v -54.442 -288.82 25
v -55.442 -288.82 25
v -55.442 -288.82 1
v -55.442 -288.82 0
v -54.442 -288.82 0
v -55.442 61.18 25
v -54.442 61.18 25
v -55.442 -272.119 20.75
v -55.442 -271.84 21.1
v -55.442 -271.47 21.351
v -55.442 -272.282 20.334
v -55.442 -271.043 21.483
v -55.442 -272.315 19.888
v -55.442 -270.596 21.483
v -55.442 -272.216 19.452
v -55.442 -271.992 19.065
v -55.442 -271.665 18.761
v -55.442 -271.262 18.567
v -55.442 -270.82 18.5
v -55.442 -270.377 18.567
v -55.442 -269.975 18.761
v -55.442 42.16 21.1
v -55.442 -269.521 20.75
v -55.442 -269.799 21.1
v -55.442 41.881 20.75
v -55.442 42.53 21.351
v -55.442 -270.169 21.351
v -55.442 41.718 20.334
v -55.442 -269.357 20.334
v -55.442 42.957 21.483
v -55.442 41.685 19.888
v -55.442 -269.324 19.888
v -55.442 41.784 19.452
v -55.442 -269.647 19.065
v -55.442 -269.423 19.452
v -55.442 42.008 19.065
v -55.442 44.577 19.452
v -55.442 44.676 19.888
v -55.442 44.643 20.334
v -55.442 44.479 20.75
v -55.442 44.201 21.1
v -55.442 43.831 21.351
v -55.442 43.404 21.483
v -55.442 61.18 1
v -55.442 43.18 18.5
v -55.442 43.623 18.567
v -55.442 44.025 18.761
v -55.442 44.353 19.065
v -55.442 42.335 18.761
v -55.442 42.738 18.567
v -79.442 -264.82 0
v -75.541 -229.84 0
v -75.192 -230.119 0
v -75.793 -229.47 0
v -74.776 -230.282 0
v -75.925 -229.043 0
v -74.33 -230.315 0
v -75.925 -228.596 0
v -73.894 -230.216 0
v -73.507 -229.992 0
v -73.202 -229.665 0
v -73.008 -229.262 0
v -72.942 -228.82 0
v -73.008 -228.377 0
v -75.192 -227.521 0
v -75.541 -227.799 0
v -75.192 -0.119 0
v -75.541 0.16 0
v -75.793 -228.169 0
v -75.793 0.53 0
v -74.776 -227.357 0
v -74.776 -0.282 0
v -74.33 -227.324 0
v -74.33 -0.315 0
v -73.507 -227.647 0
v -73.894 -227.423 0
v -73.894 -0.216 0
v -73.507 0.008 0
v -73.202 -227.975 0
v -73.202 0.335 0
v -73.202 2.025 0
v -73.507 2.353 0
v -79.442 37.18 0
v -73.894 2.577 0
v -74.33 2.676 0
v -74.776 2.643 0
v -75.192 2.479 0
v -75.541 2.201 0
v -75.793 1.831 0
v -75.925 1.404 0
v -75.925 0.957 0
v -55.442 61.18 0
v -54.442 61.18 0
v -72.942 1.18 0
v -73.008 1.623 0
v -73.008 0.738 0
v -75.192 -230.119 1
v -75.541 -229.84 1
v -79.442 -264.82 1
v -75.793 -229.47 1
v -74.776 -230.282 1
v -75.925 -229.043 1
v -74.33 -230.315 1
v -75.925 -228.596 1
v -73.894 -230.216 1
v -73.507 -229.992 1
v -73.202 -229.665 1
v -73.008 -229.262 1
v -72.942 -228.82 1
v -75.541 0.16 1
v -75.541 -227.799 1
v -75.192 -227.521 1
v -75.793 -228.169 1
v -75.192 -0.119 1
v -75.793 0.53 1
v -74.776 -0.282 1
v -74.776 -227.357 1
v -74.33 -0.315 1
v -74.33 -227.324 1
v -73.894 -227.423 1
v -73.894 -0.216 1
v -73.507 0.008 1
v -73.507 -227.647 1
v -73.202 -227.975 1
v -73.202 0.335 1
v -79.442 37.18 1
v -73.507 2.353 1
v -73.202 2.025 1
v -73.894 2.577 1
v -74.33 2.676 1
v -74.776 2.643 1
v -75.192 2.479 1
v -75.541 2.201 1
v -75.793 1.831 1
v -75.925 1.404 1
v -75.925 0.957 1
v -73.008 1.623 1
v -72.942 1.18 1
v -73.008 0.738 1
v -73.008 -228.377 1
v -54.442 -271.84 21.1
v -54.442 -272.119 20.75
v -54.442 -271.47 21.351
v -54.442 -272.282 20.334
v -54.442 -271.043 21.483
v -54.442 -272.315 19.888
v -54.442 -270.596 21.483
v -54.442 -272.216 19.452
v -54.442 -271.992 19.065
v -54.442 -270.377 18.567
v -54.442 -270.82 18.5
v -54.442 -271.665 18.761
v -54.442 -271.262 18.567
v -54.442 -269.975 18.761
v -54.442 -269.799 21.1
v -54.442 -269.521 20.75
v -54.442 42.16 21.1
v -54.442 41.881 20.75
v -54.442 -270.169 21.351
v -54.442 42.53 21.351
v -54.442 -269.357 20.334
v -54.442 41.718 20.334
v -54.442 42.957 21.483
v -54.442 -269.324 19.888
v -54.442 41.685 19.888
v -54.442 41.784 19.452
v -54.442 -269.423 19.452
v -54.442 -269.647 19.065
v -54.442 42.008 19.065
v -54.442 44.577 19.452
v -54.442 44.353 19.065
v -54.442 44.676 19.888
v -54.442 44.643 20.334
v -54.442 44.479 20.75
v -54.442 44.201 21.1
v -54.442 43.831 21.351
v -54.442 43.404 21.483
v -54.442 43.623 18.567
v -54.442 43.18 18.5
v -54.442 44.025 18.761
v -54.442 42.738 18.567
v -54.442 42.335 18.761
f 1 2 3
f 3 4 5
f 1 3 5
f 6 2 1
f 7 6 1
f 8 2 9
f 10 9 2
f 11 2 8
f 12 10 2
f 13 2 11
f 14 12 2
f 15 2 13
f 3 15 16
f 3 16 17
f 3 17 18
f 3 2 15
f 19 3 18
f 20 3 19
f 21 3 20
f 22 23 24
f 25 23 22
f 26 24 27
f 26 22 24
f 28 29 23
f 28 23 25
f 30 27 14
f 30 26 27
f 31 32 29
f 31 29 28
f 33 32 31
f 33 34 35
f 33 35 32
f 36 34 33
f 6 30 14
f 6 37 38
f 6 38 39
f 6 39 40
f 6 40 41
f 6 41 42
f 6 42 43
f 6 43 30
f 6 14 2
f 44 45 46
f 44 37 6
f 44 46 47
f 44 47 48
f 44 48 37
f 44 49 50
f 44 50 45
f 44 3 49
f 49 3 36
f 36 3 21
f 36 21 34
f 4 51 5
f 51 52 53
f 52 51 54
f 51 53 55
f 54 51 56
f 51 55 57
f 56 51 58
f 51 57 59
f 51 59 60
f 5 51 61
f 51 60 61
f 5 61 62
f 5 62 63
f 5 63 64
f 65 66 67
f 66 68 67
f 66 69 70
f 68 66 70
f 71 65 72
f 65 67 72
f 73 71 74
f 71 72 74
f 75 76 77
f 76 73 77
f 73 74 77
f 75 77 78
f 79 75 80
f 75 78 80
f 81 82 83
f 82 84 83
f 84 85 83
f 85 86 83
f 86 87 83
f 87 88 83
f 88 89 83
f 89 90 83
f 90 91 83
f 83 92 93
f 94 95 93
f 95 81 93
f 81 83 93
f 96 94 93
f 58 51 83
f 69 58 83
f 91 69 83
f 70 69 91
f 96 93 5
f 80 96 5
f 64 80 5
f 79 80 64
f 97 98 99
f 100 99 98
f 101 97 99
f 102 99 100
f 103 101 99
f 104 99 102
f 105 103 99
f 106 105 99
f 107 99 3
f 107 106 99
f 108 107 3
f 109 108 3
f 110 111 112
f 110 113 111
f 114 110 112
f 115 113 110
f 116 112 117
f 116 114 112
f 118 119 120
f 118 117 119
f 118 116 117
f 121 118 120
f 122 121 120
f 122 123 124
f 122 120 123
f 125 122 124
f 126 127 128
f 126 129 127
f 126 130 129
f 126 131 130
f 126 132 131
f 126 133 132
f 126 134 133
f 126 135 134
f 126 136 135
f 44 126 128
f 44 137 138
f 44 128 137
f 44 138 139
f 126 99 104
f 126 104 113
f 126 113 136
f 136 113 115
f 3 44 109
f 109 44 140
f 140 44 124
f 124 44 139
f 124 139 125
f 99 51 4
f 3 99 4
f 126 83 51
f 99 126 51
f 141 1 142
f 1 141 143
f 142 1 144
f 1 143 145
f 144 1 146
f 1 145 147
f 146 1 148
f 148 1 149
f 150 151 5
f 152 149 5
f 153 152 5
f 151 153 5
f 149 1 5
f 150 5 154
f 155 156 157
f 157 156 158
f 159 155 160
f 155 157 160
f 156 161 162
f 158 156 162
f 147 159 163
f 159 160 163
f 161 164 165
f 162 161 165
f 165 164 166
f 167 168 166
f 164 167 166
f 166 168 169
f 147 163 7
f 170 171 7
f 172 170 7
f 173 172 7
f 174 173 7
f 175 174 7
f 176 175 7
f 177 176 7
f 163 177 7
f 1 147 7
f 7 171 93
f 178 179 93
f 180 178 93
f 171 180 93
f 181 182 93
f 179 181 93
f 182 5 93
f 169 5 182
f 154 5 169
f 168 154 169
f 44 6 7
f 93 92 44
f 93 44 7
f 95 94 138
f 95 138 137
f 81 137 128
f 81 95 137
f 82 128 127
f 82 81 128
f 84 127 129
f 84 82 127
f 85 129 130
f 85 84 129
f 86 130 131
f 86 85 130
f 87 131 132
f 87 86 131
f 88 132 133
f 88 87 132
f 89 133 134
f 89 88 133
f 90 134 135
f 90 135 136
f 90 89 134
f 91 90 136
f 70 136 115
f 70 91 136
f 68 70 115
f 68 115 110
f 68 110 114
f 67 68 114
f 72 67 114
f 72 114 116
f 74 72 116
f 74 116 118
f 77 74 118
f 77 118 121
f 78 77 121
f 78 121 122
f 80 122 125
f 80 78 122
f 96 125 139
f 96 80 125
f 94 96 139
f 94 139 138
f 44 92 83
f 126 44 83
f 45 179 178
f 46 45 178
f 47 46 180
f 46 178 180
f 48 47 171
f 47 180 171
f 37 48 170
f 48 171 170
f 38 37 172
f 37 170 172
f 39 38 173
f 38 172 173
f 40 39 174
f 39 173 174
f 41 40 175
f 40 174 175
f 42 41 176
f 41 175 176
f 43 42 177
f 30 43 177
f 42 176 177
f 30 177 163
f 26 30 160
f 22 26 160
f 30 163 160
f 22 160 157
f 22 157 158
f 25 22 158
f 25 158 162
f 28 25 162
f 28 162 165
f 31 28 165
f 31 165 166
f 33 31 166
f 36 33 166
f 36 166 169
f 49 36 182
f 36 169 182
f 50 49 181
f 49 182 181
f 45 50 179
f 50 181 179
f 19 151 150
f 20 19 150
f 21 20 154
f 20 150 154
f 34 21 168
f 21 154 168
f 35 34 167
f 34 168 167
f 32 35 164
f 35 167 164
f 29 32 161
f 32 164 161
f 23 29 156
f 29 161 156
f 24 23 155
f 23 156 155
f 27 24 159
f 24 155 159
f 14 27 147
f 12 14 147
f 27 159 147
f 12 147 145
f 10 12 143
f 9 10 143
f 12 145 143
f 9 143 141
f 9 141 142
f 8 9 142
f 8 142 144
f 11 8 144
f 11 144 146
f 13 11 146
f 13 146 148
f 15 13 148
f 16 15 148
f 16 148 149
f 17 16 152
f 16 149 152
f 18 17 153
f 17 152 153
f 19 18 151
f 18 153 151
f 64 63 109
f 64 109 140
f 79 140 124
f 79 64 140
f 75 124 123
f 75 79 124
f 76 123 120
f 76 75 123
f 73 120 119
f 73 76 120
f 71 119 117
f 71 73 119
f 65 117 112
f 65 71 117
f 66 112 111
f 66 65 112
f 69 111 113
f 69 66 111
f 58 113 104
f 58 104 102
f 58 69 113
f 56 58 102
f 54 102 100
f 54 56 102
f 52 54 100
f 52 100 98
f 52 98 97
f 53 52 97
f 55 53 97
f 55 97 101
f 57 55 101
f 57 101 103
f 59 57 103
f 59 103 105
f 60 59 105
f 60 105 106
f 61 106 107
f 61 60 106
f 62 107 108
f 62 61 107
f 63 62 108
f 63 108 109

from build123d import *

# Parameters (mm, degrees)
CROQUIS2_W              = 1
CROQUIS2_H              = 350
SALIENTE_EXTRUIR2_DEPTH = 25
CROQUIS5_R              = 1.5
CORTAR_EXTRUIR2_DEPTH   = 1
CROQUIS1_R              = 1.5
SALIENTE_EXTRUIR3_DEPTH = 1


with BuildPart() as part:
    # Croquis2 → Saliente-Extruir2 (new body)
    with BuildSketch(Plane.XY):
        with Locations((-54.941785307, -113.819624774)):
            Rectangle(CROQUIS2_W, CROQUIS2_H)
    extrude(amount=SALIENTE_EXTRUIR2_DEPTH)

    # Croquis5 → Cortar-Extruir2 (cut)
    with BuildSketch(Plane(origin=(-54.441785307, 0, 0), x_dir=(0, 0, -1), z_dir=(1, 0, 0))):
        with Locations((-20, 43.180375226)):
            Circle(CROQUIS5_R)
        with Locations((-20, -270.819624774)):
            Circle(CROQUIS5_R)
    extrude(amount=-CORTAR_EXTRUIR2_DEPTH, mode=Mode.SUBTRACT)

    # Croquis1 → Saliente-Extruir3 (add)
    with BuildSketch(Plane.XY):
        Polygon((-55.441785307, 61.180375226), (-79.441785307, 37.180375226), (-79.441785307, -264.819624774), (-55.441785307, -288.819624774), align=None)
        with Locations((-74.441785307, 1.180375226)):
            Circle(CROQUIS1_R, mode=Mode.SUBTRACT)
        with Locations((-74.441785307, -228.819624774)):
            Circle(CROQUIS1_R, mode=Mode.SUBTRACT)
    extrude(amount=SALIENTE_EXTRUIR3_DEPTH)


solid = part.part
